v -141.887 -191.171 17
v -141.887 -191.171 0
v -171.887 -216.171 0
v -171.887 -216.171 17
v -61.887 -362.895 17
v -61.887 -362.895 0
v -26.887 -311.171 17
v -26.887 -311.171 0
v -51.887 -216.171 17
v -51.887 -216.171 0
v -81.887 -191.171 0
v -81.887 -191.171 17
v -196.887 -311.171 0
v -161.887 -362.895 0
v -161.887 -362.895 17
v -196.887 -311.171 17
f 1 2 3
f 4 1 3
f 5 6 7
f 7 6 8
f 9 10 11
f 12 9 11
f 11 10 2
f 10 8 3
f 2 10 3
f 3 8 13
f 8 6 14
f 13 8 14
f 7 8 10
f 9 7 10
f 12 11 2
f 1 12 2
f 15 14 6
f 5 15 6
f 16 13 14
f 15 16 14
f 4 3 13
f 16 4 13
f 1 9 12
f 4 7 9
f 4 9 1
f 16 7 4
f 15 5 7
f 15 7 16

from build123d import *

# Parameters (mm, degrees)
F1_DEPTH = 17
F2_ANGLE = 180


with BuildPart() as f1:
    # F0 (on Top) → F1 (new body)
    with BuildSketch(Plane.XY):
        Polygon((-256.887055, -71.171104), (-231.887055, -166.171104), (-201.887055, -191.171104), (-141.887055, -191.171104), (-111.887055, -166.171104), (-86.887055, -71.171104), (-121.887055, -19.446782), (-221.887055, -19.446782), align=None)
    extrude(amount=F1_DEPTH)


with BuildPart() as f1_1:
    # F2: moved
    add(f1.part.rotate(Axis((-141.887055, -191.171104, 8.5), (0, 0, 1)), F2_ANGLE))


solid = f1_1.part
